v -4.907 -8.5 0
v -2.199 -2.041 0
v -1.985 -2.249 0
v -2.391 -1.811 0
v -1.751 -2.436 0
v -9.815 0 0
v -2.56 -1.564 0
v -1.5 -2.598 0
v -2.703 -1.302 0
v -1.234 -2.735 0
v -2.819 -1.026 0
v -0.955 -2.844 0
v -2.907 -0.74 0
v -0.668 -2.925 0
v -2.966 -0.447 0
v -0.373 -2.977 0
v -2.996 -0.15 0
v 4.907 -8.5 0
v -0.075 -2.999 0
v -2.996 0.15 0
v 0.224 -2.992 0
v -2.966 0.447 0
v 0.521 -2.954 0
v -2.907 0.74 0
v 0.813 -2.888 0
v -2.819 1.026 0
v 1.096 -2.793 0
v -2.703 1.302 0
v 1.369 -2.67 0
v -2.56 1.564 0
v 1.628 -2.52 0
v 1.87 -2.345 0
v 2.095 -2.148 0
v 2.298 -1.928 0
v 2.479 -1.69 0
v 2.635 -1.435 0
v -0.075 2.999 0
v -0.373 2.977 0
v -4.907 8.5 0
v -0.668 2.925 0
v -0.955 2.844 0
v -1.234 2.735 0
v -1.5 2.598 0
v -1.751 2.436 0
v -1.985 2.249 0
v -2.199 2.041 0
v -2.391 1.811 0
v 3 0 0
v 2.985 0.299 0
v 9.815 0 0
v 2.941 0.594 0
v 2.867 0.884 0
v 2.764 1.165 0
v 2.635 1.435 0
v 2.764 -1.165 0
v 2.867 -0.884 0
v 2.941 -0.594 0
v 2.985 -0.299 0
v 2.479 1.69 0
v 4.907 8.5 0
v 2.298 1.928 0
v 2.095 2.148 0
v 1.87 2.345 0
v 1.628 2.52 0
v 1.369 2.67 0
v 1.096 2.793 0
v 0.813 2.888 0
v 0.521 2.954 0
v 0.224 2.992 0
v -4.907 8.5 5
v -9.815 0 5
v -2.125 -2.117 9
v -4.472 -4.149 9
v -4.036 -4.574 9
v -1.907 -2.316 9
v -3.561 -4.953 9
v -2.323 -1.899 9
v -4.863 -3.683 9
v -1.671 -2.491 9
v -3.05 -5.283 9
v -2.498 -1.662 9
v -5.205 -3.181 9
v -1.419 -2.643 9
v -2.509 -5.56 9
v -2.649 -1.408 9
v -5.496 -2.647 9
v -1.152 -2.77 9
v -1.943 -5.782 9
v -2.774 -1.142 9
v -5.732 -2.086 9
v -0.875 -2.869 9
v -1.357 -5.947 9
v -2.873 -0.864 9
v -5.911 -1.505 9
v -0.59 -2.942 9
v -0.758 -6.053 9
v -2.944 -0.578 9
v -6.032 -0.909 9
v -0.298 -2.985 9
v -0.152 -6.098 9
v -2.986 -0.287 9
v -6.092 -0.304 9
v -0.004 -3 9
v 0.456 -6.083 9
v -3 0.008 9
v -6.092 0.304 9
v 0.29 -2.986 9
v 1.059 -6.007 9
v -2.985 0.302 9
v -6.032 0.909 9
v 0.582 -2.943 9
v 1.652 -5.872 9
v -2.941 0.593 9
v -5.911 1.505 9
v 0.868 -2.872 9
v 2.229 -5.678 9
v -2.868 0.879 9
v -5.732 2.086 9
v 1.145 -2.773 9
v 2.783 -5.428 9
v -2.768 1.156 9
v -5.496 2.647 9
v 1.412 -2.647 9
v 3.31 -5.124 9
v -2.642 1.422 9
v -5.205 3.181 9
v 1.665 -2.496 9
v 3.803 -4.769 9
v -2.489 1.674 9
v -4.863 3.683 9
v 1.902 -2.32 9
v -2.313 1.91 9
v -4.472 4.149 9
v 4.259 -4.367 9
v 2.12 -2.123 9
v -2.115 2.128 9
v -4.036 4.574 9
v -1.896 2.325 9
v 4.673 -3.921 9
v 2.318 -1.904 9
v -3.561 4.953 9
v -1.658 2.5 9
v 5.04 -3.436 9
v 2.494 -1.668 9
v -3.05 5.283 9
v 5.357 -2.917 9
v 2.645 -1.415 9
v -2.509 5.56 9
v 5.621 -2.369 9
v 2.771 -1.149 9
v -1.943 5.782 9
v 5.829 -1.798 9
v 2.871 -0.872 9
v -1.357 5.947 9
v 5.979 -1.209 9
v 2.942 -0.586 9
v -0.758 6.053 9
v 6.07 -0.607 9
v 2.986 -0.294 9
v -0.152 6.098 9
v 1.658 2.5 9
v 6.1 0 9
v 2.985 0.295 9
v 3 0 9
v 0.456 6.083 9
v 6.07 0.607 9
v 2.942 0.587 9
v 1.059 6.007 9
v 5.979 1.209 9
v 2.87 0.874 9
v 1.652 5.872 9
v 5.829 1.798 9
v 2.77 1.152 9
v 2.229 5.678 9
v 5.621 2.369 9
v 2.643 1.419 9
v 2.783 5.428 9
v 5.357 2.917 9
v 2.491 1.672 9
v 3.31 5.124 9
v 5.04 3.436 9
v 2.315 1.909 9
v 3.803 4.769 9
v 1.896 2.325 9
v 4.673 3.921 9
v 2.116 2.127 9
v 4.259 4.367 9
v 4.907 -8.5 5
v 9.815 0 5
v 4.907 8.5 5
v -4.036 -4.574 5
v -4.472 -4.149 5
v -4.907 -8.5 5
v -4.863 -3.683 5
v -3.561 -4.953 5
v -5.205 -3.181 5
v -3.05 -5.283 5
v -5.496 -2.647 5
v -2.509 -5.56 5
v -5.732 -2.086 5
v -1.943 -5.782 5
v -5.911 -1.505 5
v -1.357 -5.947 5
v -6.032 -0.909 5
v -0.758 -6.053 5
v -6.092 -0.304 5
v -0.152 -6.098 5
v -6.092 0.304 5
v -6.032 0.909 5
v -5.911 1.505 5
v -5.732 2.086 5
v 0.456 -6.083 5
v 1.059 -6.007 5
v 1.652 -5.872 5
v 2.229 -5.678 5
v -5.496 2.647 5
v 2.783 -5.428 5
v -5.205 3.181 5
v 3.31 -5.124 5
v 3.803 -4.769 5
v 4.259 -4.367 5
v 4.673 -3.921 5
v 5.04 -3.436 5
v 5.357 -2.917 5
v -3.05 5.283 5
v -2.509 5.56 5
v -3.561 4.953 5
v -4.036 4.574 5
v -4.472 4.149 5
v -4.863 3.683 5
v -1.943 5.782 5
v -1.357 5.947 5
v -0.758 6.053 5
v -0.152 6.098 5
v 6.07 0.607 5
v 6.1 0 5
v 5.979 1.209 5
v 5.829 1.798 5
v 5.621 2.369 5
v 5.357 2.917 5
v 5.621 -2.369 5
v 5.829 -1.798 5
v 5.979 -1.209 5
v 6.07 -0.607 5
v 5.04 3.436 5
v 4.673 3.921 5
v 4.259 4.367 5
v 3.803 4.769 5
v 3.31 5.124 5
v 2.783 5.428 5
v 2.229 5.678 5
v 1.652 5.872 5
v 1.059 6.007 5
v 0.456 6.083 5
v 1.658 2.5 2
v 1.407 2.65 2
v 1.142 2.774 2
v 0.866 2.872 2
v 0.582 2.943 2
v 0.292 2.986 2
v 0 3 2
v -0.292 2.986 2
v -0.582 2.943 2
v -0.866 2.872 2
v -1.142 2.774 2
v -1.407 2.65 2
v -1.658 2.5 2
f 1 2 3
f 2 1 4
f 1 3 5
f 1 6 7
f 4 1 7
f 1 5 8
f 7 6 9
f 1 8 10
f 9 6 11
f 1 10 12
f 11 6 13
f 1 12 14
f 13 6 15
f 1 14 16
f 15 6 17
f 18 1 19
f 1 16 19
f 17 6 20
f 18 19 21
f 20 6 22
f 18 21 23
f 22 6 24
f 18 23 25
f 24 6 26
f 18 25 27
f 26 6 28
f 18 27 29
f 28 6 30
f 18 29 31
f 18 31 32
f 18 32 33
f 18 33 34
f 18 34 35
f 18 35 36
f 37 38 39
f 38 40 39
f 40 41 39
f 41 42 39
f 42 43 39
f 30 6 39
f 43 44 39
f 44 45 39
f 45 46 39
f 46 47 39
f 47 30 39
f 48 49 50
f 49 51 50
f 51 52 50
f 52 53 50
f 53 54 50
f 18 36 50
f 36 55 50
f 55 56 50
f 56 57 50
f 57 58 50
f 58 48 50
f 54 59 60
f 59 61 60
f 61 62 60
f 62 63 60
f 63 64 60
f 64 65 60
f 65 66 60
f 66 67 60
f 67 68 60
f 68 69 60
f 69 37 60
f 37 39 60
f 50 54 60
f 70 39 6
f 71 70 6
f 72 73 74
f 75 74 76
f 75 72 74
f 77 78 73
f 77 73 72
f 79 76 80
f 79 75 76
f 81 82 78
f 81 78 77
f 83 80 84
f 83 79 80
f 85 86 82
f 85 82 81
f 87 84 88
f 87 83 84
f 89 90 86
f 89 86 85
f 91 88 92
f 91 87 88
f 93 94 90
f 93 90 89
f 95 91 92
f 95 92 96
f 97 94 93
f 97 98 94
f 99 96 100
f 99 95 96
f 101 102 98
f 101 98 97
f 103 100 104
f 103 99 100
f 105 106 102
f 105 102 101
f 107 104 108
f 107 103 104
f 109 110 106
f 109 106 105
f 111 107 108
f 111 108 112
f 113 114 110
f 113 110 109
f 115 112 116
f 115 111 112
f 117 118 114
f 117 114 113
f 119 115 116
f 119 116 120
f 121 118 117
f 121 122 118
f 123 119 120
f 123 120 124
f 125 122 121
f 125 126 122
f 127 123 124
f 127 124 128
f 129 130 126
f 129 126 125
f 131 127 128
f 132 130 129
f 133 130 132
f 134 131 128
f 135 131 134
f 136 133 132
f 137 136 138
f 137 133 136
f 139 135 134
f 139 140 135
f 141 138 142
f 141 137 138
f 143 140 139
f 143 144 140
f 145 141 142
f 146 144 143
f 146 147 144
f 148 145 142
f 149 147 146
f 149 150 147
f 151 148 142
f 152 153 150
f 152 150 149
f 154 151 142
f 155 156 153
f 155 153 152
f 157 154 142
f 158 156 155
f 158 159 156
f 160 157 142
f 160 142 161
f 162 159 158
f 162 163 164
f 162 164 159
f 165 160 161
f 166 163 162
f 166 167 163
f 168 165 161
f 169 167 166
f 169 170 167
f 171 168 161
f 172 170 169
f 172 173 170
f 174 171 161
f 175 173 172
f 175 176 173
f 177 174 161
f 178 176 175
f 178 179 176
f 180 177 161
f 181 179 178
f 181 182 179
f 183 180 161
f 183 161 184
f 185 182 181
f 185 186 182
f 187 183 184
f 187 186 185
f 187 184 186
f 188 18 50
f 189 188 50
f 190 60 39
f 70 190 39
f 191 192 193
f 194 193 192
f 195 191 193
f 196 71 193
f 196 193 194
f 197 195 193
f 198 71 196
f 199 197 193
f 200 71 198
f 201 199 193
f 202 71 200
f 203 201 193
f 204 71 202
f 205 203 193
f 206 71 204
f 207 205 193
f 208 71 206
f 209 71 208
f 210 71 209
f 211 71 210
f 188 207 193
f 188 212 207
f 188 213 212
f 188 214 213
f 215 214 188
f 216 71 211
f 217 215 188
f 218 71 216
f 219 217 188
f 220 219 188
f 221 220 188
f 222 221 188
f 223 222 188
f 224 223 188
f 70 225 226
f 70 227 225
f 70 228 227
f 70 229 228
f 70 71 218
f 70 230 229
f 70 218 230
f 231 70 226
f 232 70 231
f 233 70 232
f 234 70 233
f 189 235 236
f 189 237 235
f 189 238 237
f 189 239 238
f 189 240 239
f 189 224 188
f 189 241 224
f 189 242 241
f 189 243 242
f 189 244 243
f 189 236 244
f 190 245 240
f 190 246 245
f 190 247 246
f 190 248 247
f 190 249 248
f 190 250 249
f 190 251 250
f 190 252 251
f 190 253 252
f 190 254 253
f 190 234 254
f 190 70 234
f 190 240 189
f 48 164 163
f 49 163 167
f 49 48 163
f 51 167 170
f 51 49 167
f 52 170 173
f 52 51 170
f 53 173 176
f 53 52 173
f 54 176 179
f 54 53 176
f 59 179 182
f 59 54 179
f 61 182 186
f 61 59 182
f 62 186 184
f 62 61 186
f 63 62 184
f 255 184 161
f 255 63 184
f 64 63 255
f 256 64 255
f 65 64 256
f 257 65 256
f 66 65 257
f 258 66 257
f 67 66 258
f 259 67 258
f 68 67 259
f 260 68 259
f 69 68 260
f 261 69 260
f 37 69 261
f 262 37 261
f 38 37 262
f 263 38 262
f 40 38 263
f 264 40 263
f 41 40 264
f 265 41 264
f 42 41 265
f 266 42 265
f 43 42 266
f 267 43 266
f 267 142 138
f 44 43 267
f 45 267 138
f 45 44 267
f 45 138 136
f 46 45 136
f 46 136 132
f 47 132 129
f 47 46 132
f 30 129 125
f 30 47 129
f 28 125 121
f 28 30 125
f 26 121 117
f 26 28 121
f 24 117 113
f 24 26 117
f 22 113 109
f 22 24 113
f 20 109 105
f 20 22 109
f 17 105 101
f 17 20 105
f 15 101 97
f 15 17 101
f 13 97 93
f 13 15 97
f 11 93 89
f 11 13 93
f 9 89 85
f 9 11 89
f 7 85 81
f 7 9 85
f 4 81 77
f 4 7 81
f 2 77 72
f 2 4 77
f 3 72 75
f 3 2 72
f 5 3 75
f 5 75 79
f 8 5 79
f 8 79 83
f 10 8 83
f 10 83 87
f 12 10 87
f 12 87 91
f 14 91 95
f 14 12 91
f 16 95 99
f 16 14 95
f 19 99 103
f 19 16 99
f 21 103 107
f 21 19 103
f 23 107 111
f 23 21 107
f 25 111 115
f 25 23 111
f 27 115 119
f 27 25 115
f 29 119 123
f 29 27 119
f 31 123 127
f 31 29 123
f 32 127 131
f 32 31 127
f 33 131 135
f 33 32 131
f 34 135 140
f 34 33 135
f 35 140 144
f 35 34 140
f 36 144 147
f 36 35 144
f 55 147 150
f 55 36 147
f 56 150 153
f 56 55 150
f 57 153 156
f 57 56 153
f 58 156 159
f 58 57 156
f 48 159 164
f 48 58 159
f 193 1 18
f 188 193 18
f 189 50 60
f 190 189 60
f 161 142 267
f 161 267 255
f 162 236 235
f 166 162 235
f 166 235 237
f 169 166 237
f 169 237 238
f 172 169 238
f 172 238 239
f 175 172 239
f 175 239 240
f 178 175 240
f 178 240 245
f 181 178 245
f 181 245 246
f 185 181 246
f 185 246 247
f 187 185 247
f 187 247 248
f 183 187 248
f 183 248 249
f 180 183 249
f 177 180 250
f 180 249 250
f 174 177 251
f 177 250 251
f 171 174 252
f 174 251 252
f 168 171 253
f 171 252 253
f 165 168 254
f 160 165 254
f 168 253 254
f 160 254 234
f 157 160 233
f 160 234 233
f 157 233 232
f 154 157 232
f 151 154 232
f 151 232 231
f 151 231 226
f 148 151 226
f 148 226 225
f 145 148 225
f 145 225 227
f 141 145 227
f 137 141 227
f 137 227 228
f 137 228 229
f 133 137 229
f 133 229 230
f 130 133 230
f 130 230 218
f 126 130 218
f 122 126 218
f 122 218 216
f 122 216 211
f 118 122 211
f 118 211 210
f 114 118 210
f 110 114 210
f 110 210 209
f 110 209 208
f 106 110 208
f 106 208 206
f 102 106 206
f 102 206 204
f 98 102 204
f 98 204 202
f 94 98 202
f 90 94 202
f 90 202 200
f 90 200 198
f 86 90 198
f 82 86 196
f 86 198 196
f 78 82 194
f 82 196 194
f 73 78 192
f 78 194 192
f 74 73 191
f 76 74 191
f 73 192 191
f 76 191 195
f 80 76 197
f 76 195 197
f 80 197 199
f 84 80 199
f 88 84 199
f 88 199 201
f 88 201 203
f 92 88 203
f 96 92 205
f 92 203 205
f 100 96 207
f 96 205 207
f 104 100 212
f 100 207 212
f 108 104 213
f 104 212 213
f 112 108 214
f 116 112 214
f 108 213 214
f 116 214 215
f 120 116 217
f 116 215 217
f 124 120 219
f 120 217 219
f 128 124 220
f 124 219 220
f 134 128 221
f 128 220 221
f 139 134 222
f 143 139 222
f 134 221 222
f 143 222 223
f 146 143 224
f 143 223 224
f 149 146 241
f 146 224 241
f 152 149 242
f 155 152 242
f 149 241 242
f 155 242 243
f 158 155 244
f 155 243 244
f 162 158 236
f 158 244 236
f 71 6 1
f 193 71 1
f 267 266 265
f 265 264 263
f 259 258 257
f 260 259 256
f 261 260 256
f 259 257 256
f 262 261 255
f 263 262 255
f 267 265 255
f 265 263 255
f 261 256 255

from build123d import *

# Parameters (mm, degrees)
SKETCH_R      = 3
PAD_DEPTH     = 5
SKETCH001_R   = 6.1
SKETCH001_R_2 = 3
PAD001_DEPTH  = 10
PAD002_DEPTH  = 13
SKETCH003_R   = 6.1
POCKET_DEPTH  = 6


with BuildPart() as part:
    # Sketch → Pad (new body)
    with BuildSketch(Plane.XY):
        Polygon((9.814955, 0), (4.907477, 8.5), (-4.907477, 8.5), (-9.814955, 0), (-4.907477, -8.5), (4.907477, -8.5), align=None)
        Circle(SKETCH_R, mode=Mode.SUBTRACT)
    extrude(amount=PAD_DEPTH)

    # Sketch001 (on Face9 of Pad) → Pad001 (join)
    with BuildSketch(Plane.XY.offset(5)):
        Circle(SKETCH001_R)
        Circle(SKETCH001_R_2, mode=Mode.SUBTRACT)
    extrude(amount=PAD001_DEPTH)

    # Sketch002 (on Face12 of Pad001) → Pad002 (join)
    with BuildSketch(Plane.XY.offset(15)):
        with BuildLine():
            Line((-1.658312, 2.5), (1.658312, 2.5))
            ThreePointArc((1.658312, 2.5), (0, 3), (-1.658312, 2.5))
        make_face()
    extrude(amount=-PAD002_DEPTH)

    # Sketch003 (on Face15 of Pad002) → Pocket (cut)
    with BuildSketch(Plane.XY.offset(15)):
        Circle(SKETCH003_R)
    extrude(amount=-POCKET_DEPTH, mode=Mode.SUBTRACT)


solid = part.part
